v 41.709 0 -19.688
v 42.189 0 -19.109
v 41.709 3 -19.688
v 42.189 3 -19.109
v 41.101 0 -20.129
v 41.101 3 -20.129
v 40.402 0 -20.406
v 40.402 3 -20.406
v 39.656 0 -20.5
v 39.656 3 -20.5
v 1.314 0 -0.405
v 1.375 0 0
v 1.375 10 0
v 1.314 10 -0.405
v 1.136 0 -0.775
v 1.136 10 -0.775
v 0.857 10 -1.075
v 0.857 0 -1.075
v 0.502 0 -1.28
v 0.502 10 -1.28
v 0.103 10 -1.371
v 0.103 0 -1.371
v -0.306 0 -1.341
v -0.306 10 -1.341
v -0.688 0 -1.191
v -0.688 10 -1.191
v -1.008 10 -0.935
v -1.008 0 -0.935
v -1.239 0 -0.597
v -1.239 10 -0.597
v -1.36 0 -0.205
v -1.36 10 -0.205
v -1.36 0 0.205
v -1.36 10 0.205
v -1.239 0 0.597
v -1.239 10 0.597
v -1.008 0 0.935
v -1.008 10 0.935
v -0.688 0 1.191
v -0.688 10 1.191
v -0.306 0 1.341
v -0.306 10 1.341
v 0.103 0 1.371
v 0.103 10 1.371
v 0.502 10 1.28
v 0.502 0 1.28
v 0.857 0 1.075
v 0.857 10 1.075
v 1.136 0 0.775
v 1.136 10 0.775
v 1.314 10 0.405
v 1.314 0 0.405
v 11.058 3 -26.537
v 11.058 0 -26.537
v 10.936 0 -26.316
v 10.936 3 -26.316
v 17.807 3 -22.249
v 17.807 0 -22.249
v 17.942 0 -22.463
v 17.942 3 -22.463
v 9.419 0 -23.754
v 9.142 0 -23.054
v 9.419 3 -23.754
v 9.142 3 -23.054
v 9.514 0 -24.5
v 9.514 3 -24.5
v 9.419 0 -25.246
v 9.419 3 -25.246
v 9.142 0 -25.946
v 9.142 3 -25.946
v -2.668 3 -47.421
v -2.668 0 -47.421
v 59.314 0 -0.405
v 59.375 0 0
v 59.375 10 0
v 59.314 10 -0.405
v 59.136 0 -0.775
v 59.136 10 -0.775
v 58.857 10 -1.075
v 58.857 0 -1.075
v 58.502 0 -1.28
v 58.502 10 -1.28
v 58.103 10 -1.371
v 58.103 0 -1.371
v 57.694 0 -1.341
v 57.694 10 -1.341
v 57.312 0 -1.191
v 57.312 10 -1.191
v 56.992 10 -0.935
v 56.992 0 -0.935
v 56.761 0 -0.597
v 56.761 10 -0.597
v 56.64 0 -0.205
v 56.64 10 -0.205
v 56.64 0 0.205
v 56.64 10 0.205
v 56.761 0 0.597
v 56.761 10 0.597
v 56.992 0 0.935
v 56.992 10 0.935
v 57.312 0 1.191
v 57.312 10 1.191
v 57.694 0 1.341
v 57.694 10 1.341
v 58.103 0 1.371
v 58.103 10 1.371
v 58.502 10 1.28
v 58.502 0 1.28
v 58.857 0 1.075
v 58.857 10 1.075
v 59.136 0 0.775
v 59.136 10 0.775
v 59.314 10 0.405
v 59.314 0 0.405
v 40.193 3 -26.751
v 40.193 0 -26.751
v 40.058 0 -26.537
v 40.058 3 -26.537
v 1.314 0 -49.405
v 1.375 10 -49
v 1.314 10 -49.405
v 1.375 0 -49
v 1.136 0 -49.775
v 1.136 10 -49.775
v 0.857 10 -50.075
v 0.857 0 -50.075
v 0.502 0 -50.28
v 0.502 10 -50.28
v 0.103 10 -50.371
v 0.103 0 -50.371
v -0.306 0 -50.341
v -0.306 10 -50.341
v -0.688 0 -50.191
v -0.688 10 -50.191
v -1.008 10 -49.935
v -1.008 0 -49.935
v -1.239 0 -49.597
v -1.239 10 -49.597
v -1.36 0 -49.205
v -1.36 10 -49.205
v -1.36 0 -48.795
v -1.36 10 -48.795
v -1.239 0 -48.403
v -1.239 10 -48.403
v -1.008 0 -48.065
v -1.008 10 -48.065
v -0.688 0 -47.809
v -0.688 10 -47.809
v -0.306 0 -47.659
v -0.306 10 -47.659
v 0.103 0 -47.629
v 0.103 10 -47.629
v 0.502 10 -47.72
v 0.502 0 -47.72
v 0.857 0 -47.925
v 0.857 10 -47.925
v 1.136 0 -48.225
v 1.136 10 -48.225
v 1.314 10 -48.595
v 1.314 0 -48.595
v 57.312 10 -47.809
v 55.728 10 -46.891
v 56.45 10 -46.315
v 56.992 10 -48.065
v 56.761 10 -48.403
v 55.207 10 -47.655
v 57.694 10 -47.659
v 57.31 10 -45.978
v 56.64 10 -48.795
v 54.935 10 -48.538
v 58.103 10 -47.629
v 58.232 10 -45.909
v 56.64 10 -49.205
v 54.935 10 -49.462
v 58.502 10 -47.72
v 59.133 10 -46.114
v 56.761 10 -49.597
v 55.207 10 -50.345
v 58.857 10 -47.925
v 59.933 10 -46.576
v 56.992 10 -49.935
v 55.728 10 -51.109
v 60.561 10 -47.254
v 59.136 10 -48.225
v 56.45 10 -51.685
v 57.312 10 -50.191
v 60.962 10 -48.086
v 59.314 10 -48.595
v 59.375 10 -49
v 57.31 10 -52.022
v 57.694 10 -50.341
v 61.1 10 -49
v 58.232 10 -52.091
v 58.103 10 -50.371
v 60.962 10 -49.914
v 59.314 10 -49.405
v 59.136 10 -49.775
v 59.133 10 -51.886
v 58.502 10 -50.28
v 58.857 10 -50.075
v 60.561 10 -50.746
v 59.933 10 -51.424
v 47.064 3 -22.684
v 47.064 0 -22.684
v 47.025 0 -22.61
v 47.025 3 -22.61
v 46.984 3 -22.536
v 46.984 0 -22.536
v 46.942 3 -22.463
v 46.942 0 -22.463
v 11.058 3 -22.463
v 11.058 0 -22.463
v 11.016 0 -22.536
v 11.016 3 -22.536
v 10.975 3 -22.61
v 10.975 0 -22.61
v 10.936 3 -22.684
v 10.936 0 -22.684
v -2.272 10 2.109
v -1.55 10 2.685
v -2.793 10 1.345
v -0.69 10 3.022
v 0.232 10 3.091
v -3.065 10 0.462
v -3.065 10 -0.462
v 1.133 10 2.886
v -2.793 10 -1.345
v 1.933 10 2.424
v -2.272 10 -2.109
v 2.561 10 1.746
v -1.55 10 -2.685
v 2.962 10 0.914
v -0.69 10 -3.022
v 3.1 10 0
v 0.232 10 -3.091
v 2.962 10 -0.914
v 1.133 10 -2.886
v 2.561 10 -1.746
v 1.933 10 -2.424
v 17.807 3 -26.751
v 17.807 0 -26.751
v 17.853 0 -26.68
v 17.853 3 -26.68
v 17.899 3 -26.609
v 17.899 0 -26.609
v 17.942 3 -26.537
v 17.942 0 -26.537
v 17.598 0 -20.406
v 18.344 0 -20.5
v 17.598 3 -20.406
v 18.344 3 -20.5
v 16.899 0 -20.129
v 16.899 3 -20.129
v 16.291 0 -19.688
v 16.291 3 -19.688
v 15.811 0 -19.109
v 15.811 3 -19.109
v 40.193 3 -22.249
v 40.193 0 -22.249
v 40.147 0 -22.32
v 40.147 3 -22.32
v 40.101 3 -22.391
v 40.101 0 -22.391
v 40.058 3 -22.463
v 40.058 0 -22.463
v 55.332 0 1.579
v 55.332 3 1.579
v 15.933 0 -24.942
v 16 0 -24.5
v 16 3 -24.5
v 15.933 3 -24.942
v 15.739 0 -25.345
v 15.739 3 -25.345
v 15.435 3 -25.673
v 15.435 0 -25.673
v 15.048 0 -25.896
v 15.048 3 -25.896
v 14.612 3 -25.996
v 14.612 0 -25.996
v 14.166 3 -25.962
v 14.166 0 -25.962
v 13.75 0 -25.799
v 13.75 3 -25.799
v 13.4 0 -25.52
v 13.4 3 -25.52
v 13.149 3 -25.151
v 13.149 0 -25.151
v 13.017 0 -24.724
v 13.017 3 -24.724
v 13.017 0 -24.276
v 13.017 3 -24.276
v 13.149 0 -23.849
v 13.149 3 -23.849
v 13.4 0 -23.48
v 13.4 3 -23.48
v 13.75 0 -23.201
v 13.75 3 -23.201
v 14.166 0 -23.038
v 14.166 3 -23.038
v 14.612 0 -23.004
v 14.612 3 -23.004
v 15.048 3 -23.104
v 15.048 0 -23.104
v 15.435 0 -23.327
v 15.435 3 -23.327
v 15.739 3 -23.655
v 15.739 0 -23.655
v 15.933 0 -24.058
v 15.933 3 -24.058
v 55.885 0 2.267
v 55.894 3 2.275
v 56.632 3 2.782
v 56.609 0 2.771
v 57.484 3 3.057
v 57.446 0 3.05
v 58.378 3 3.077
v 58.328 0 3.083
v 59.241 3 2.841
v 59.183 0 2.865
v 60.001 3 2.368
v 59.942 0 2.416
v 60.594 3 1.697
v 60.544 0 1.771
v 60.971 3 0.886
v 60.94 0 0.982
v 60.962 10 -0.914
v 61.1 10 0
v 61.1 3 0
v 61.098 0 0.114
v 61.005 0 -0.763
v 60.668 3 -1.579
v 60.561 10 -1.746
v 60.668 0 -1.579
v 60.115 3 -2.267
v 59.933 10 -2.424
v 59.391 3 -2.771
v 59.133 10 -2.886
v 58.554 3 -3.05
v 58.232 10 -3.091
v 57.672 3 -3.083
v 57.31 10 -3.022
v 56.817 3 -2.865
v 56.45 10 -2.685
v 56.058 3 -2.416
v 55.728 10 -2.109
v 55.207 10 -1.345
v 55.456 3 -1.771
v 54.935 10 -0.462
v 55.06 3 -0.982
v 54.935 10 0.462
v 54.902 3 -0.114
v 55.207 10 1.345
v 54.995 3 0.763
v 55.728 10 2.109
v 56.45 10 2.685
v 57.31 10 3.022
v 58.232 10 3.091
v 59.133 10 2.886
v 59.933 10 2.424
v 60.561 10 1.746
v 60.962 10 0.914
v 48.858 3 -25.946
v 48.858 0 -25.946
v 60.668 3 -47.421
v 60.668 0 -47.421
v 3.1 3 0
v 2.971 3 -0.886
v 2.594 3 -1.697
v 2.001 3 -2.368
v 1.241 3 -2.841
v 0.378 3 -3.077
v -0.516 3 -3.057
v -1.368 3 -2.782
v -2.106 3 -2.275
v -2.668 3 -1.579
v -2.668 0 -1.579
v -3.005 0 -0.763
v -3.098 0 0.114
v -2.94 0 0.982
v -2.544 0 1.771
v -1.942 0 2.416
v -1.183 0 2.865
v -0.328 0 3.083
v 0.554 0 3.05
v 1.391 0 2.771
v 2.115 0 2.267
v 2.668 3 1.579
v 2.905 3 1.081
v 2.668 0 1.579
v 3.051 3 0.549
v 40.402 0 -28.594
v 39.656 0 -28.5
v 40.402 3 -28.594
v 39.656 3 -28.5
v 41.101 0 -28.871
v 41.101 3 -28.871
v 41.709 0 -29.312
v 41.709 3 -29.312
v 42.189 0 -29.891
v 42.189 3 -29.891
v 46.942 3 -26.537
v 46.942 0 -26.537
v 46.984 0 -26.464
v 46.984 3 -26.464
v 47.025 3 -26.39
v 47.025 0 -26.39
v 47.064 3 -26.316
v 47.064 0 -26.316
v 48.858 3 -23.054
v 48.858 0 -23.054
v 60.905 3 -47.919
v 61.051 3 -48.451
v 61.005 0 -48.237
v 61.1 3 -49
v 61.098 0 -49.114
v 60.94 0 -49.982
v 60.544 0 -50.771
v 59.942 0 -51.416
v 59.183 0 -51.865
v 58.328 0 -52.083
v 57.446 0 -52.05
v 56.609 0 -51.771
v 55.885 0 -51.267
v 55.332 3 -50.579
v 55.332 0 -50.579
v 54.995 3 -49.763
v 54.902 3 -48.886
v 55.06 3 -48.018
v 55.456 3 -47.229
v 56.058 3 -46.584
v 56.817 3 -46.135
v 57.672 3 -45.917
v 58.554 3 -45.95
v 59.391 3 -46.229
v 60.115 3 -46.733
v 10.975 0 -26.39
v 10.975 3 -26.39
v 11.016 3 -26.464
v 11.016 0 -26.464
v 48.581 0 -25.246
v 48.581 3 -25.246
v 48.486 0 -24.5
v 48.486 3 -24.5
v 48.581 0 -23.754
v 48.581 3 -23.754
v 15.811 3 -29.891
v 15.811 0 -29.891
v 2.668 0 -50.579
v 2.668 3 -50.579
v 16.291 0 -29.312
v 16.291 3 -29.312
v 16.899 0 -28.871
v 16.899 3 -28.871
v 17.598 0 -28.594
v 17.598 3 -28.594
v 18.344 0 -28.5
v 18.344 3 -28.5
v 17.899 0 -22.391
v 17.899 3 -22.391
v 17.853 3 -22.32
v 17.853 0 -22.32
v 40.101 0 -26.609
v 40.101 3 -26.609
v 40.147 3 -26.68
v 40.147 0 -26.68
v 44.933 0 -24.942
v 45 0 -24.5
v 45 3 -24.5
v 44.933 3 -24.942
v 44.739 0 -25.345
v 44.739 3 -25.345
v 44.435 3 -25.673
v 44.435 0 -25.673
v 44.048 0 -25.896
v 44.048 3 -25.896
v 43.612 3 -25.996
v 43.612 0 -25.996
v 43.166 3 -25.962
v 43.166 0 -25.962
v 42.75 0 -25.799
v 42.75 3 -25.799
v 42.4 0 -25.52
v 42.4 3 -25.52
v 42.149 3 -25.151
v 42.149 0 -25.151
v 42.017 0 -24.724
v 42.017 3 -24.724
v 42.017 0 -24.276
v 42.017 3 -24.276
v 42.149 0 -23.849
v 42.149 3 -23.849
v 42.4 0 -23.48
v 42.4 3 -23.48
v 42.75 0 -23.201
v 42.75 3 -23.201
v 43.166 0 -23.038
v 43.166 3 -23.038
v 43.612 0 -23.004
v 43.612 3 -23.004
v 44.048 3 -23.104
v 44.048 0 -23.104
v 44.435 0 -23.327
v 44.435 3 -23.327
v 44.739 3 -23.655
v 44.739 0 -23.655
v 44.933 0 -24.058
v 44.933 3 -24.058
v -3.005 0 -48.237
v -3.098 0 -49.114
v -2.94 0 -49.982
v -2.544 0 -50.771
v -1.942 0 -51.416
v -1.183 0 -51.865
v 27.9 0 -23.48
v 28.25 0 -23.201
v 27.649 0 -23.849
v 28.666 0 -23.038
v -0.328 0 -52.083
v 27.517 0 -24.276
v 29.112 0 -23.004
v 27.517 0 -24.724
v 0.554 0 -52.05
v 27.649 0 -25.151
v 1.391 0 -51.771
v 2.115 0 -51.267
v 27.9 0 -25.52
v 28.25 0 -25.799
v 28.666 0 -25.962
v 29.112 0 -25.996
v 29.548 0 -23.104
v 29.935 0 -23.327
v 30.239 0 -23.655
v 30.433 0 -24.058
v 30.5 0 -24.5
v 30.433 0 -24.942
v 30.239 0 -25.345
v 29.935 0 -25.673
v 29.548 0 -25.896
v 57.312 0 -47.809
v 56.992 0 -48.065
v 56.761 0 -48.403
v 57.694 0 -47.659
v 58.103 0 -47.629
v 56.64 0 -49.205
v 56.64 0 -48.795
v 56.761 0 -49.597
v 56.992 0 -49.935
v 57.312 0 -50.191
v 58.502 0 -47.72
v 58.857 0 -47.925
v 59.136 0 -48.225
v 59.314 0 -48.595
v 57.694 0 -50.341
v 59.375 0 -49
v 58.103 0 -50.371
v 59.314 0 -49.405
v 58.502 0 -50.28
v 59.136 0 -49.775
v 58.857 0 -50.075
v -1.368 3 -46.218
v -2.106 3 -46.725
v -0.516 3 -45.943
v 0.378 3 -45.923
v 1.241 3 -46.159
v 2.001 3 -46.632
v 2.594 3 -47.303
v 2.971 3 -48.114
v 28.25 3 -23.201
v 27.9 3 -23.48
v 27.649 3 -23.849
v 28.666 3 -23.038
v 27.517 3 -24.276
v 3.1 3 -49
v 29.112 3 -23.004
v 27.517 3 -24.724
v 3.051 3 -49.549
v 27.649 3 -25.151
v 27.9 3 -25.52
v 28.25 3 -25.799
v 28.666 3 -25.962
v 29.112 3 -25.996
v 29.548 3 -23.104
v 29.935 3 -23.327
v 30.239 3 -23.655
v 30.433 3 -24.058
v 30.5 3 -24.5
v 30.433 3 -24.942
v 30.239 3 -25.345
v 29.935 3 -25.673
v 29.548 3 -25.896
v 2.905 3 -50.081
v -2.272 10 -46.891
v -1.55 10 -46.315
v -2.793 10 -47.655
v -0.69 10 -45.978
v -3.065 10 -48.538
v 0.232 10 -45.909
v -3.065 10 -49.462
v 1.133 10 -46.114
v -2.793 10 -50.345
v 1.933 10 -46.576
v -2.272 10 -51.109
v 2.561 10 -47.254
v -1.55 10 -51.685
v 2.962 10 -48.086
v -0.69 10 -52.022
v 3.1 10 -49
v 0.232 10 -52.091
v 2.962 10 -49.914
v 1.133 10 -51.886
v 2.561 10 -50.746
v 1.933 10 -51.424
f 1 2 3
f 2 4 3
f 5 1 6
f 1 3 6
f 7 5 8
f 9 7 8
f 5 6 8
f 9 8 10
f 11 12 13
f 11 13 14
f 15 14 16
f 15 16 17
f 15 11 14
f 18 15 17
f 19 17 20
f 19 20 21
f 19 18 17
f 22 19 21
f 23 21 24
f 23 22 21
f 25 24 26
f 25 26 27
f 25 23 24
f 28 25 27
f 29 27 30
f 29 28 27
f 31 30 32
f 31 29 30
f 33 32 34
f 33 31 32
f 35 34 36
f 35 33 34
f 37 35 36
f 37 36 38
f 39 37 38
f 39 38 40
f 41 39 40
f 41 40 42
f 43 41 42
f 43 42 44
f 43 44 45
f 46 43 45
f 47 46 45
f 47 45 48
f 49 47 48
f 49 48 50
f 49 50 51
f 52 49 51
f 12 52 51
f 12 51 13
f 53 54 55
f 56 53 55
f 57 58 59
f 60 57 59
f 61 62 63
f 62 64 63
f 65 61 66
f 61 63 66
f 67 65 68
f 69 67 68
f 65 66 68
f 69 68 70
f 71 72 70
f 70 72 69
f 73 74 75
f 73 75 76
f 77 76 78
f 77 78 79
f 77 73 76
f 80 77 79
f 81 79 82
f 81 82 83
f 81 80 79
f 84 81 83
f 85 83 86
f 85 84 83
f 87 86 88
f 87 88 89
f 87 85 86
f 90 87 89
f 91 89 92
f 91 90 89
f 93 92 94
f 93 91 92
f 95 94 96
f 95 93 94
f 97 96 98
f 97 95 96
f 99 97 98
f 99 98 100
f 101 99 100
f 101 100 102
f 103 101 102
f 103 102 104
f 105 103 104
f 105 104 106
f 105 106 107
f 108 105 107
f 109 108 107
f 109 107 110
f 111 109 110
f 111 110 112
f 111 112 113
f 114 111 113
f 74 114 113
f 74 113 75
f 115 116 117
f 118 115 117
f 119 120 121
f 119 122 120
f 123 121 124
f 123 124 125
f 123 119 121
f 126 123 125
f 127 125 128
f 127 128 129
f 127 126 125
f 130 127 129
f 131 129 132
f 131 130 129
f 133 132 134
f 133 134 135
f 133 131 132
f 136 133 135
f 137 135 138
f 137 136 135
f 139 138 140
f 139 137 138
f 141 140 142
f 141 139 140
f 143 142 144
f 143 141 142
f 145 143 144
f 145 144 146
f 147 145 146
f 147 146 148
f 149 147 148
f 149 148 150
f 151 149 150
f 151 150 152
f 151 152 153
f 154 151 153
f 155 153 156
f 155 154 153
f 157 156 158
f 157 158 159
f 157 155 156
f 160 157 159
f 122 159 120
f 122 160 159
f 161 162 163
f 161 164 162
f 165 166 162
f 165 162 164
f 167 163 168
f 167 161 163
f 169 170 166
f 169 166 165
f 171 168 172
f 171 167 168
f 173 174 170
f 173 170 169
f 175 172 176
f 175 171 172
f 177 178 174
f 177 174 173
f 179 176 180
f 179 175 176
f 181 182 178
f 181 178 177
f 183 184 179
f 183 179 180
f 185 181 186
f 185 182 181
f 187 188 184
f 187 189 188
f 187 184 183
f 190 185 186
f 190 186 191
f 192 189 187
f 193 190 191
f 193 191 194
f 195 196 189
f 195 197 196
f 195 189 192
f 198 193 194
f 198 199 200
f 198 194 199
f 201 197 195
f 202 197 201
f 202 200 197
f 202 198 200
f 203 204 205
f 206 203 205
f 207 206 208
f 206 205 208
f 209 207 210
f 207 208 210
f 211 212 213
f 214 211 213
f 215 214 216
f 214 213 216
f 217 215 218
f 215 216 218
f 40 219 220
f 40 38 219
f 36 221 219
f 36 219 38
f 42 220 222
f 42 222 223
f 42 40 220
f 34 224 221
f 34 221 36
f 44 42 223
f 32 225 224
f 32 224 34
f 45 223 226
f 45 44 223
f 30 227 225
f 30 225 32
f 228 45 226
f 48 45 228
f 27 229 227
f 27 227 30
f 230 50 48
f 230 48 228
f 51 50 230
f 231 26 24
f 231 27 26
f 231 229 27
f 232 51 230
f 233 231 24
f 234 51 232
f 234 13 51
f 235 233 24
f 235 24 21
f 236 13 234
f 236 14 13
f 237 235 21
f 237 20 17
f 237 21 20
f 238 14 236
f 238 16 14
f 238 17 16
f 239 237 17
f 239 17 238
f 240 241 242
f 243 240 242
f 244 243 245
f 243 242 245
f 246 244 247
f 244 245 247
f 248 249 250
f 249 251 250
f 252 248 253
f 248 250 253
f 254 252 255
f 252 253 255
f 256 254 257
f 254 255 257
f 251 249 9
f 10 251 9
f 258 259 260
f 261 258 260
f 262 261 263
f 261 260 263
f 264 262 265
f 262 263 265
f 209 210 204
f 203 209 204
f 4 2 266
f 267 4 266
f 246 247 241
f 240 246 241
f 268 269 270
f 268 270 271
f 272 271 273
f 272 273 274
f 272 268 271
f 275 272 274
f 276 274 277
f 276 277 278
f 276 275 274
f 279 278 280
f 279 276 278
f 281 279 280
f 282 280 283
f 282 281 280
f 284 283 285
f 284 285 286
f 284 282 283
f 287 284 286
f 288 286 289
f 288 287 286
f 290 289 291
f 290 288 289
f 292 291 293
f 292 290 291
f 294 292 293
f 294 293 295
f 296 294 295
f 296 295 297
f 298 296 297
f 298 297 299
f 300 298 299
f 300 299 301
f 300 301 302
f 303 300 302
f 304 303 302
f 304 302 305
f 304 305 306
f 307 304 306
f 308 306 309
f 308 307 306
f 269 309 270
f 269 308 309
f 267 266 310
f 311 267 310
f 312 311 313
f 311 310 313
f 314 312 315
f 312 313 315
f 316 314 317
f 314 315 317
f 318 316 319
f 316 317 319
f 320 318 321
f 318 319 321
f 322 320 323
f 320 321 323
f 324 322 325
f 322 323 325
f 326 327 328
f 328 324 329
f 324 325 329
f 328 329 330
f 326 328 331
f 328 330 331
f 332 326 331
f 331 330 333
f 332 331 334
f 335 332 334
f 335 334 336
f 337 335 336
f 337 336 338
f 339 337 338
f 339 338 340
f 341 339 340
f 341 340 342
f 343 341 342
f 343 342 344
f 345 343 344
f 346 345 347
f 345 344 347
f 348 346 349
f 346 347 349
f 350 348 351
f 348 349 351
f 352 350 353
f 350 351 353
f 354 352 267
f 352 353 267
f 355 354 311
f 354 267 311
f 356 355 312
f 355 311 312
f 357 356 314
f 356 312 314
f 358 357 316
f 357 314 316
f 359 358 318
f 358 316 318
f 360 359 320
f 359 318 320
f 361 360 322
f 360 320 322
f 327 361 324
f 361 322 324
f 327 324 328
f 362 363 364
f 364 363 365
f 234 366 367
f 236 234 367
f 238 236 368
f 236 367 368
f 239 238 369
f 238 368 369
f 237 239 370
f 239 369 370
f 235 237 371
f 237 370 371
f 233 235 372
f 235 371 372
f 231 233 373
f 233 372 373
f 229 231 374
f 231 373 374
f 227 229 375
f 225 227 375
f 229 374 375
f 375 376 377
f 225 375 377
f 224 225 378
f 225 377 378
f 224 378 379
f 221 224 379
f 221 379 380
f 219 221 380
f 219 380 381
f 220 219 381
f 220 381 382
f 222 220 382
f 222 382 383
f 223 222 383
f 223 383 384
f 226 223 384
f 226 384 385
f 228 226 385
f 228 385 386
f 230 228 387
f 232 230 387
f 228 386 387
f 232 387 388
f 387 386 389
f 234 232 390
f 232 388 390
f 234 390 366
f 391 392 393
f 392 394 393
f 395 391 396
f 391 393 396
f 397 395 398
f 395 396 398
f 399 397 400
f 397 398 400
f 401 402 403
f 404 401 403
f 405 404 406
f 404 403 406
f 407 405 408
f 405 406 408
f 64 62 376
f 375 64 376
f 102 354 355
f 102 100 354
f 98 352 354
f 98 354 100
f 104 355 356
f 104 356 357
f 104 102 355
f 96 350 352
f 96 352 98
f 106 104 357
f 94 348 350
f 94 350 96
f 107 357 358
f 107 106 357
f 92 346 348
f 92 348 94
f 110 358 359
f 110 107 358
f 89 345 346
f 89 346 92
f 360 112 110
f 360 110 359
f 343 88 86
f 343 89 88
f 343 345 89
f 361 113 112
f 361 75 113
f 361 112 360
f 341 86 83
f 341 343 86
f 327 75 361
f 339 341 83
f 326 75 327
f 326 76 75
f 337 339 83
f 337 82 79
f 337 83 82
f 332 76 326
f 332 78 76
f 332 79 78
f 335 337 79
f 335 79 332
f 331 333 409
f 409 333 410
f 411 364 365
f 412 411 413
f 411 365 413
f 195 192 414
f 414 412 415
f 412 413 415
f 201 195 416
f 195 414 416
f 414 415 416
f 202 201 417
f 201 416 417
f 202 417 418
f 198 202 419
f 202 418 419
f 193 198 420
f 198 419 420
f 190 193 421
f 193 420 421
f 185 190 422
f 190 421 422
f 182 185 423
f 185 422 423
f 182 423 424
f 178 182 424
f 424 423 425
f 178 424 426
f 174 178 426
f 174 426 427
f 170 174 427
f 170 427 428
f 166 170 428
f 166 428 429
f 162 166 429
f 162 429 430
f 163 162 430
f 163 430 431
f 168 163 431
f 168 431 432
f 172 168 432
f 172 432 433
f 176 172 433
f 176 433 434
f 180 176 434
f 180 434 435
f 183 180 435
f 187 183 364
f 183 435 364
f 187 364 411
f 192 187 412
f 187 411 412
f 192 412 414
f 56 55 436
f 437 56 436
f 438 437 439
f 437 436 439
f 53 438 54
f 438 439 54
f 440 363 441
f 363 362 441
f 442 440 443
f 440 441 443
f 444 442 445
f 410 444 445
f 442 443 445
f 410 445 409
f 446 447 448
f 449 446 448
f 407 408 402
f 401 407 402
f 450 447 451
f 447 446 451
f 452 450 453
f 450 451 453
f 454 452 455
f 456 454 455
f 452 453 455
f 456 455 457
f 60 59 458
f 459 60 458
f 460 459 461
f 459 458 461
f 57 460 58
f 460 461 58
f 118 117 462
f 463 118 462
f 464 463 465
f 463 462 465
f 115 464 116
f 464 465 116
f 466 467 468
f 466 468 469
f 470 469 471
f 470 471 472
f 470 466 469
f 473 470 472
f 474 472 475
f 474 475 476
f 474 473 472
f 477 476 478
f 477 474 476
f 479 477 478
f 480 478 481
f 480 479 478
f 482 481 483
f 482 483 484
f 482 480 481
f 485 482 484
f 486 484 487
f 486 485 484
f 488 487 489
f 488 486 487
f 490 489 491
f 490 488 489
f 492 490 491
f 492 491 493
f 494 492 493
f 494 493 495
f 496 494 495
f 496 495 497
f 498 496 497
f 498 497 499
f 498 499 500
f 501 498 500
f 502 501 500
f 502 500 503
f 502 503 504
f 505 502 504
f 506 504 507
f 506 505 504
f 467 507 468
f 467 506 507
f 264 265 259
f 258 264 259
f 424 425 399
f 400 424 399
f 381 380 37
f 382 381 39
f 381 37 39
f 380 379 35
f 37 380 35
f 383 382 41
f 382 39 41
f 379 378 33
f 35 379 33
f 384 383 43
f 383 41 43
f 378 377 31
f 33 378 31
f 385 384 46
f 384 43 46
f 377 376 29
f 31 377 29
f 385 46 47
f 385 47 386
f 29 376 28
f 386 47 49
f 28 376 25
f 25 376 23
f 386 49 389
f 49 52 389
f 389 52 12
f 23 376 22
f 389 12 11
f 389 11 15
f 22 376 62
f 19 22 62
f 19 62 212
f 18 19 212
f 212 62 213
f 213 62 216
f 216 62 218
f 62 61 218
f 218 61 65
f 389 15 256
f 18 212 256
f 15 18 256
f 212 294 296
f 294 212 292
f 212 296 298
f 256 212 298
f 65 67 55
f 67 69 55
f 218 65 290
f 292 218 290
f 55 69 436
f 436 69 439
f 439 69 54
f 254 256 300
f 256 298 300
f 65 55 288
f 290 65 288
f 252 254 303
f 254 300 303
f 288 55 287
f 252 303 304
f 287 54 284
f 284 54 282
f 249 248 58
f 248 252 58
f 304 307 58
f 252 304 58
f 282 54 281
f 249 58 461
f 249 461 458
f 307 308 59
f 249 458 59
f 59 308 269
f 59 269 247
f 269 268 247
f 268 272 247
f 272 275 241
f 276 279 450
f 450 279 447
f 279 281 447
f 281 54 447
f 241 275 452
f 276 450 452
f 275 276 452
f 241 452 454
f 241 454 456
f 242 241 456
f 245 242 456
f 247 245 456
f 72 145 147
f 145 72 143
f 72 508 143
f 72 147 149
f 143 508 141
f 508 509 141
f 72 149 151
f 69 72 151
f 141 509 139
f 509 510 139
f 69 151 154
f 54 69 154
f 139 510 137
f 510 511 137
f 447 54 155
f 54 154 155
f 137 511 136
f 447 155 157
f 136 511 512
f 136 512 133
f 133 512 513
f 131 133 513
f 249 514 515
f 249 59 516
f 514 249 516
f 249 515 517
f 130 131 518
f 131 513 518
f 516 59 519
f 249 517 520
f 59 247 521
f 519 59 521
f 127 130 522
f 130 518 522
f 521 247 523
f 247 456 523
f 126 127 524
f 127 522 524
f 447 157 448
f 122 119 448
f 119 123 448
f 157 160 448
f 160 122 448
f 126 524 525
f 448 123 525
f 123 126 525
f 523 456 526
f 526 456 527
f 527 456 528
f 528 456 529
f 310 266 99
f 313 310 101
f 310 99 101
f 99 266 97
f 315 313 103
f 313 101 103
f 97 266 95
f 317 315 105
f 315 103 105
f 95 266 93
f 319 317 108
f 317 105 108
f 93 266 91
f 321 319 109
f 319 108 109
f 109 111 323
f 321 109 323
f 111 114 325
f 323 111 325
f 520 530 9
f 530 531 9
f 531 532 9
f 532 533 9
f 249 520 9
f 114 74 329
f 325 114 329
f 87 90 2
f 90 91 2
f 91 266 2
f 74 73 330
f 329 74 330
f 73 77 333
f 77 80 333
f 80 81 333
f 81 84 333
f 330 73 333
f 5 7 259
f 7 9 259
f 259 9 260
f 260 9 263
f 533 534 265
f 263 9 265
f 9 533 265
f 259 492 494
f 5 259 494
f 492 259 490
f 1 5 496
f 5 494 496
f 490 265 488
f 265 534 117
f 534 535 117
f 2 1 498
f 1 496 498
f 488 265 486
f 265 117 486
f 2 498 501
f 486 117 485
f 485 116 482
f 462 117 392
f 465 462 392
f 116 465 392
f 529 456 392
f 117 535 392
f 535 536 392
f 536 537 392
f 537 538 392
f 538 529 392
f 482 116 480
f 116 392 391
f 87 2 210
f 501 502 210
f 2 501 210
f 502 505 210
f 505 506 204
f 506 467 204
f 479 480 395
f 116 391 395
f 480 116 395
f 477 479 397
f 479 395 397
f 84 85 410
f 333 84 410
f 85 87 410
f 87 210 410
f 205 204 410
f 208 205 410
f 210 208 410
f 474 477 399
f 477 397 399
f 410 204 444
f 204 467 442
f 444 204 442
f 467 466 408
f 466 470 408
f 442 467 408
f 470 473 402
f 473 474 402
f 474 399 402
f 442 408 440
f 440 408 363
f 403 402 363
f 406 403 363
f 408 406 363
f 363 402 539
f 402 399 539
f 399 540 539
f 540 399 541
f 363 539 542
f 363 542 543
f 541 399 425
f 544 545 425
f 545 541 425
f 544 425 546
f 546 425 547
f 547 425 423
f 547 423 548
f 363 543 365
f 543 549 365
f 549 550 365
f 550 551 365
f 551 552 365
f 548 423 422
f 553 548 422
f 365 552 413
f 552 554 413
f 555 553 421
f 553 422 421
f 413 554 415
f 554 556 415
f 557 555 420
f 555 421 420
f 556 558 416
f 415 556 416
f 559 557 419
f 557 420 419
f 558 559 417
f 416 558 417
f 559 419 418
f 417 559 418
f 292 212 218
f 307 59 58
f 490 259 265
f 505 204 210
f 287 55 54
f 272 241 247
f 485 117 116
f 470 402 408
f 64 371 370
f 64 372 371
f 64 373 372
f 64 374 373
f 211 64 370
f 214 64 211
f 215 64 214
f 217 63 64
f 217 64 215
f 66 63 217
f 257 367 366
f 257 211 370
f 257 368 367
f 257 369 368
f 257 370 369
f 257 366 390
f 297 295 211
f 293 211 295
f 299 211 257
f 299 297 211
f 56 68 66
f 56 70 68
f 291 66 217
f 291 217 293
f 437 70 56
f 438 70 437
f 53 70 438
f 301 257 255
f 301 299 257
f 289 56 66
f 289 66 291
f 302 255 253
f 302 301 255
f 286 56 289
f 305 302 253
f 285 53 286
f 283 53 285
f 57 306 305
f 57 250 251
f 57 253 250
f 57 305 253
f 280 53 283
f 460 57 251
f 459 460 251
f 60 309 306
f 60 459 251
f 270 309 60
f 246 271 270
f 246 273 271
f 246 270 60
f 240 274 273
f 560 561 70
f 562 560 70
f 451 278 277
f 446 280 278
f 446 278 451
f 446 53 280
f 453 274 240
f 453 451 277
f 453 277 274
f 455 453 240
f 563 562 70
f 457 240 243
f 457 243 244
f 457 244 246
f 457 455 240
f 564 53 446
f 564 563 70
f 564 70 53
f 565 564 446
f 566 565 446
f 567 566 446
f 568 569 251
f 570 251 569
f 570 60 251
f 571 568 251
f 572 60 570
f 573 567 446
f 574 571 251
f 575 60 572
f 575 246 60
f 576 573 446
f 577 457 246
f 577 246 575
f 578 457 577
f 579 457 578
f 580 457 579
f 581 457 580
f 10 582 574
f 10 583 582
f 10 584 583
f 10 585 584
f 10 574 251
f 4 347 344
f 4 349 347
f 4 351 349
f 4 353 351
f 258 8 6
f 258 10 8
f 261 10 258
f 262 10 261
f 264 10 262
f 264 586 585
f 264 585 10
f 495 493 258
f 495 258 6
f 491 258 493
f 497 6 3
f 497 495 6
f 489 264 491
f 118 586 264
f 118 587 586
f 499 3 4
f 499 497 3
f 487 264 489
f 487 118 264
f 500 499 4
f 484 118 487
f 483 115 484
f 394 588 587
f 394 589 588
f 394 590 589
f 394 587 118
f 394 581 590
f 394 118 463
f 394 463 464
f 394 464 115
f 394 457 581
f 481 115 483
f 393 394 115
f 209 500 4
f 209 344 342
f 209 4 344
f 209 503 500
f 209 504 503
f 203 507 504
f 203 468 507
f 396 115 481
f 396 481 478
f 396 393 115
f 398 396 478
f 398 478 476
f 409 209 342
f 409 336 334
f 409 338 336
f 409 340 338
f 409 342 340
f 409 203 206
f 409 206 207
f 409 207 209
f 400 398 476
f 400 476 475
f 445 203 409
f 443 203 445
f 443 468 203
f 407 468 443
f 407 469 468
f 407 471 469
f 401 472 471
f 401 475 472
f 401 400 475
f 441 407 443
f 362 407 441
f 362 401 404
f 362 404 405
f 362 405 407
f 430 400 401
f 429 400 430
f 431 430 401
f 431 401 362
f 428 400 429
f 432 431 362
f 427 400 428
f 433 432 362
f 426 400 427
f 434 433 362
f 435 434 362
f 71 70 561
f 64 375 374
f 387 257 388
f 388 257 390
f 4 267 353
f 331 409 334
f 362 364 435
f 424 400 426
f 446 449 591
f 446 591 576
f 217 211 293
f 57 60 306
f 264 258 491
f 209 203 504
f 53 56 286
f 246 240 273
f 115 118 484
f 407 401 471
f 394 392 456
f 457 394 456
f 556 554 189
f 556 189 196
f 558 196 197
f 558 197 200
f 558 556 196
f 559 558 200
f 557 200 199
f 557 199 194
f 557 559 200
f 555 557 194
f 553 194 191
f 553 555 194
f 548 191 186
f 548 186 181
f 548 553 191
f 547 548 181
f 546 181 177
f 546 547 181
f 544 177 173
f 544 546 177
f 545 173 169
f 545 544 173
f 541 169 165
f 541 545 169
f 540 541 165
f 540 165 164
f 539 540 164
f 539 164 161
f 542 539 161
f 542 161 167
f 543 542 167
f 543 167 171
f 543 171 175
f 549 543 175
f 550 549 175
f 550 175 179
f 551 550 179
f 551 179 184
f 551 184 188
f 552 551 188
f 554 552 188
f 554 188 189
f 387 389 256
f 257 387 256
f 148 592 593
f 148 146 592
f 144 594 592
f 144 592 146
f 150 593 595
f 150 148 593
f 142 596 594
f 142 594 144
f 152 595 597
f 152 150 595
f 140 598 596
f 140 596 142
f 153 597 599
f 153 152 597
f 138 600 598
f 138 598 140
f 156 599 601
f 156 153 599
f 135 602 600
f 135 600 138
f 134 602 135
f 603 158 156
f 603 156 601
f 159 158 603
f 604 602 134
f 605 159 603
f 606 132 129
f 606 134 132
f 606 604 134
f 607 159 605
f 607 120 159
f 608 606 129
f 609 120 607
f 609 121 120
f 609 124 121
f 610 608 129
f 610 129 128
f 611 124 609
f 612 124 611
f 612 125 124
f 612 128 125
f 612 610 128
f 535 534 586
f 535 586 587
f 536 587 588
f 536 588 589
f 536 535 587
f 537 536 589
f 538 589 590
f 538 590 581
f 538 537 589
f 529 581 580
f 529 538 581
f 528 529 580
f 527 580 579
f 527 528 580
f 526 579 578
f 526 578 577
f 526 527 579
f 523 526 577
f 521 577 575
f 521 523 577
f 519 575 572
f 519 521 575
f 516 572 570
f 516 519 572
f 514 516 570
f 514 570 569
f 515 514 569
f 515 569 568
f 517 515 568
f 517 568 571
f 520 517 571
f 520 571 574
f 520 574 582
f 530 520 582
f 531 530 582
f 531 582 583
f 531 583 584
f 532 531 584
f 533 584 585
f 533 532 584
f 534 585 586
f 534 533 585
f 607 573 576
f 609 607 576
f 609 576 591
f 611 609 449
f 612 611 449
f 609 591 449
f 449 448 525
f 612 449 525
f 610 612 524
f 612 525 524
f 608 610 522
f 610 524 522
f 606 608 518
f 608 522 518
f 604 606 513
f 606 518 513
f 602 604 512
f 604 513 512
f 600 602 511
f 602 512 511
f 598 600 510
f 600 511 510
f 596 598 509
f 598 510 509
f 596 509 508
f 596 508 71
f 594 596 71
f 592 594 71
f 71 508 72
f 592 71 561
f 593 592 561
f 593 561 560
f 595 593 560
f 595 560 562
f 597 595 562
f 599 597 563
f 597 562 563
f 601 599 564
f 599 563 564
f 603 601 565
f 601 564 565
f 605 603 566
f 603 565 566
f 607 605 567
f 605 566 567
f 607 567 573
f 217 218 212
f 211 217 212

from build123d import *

# Parameters (mm, degrees)
SKETCH1_R           = 1.5
SKETCH1_R_2         = 4
SKETCH1_R_3         = 3.1
SKETCH1_R_4         = 1.375
BOSS_EXTRUDE1_DEPTH = 3
SKETCH2_R           = 3.1
SKETCH2_R_2         = 1.375
BOSS_EXTRUDE2_DEPTH = 7
FILLET4_R           = 3


with BuildPart() as part:
    # Sketch1 → Boss-Extrude1 (new body)
    with BuildSketch(Plane(origin=(0, 0, 0), x_dir=(1, 0, 0), z_dir=(0, 1, 0))):
        with BuildLine():
            ThreePointArc((10.93588599, 22.68421055), (10.5, 24.5), (10.93588599, 26.31578945))
            Line((10.93588599, 26.31578945), (9.937320588, 24.5))
            Line((9.937320588, 24.5), (10.93588599, 22.68421055))
        make_face()
        with BuildLine():
            Line((16.695320866, 28.5), (14.5, 28.5))
            ThreePointArc((14.5, 28.5), (16.370485645, 28.035715409), (17.806752459, 26.750641726))
            Line((17.806752459, 26.750641726), (16.695320866, 28.5))
        make_face()
        with BuildLine():
            Line((14.5, 20.5), (16.695320866, 20.5))
            Line((16.695320866, 20.5), (17.806752459, 22.249358274))
            ThreePointArc((17.806752459, 22.249358274), (16.370485645, 20.964284591), (14.5, 20.5))
        make_face()
        with BuildLine():
            ThreePointArc((17.806752459, 26.750641726), (16.370485645, 28.035715409), (14.5, 28.5))
            ThreePointArc((14.5, 28.5), (12.518729486, 27.974847788), (11.057693269, 26.537283576))
            Line((11.057693269, 26.537283576), (10.93588599, 26.31578945))
            ThreePointArc((10.93588599, 26.31578945), (10.5, 24.5), (10.93588599, 22.68421055))
            Line((10.93588599, 22.68421055), (11.057693269, 22.462716424))
            ThreePointArc((11.057693269, 22.462716424), (12.518729486, 21.025152212), (14.5, 20.5))
            ThreePointArc((14.5, 20.5), (16.370485645, 20.964284591), (17.806752459, 22.249358274))
            Line((17.806752459, 22.249358274), (17.942306731, 22.462716424))
            ThreePointArc((17.942306731, 22.462716424), (18.35805825, 23.443881381), (18.5, 24.5))
            ThreePointArc((18.5, 24.5), (18.35805825, 25.556118619), (17.942306731, 26.537283576))
            Line((17.942306731, 26.537283576), (17.806752459, 26.750641726))
        make_face()
        with Locations((14.5, 24.5)):
            Circle(SKETCH1_R, mode=Mode.SUBTRACT)
        with BuildLine():
            Line((29, 28.5), (16.695320866, 28.5))
            Line((16.695320866, 28.5), (17.806752459, 26.750641726))
            ThreePointArc((17.806752459, 26.750641726), (17.876215398, 26.645033703), (17.942306731, 26.537283576))
            ThreePointArc((17.942306731, 26.537283576), (18.35805825, 25.556118619), (18.5, 24.5))
            ThreePointArc((18.5, 24.5), (18.35805825, 23.443881381), (17.942306731, 22.462716424))
            ThreePointArc((17.942306731, 22.462716424), (17.876215398, 22.354966297), (17.806752459, 22.249358274))
            Line((17.806752459, 22.249358274), (16.695320866, 20.5))
            Line((16.695320866, 20.5), (29, 20.5))
            ThreePointArc((29, 20.5), (25, 24.5), (29, 28.5))
        make_face()
        with Locations((29, 24.5)):
            Circle(SKETCH1_R_2)
        with Locations((29, 24.5)):
            Circle(SKETCH1_R, mode=Mode.SUBTRACT)
        with BuildLine():
            Line((41.304679134, 28.5), (29, 28.5))
            ThreePointArc((29, 28.5), (31.828427125, 27.328427125), (33, 24.5))
            ThreePointArc((33, 24.5), (31.828427125, 21.671572875), (29, 20.5))
            Line((29, 20.5), (41.304679134, 20.5))
            Line((41.304679134, 20.5), (40.193247541, 22.249358274))
            ThreePointArc((40.193247541, 22.249358274), (40.123784602, 22.354966297), (40.057693269, 22.462716424))
            ThreePointArc((40.057693269, 22.462716424), (39.5, 24.5), (40.057693269, 26.537283576))
            ThreePointArc((40.057693269, 26.537283576), (40.123784602, 26.645033703), (40.193247541, 26.750641726))
            Line((40.193247541, 26.750641726), (41.304679134, 28.5))
        make_face()
        with BuildLine():
            Line((40.193247541, 22.249358274), (41.304679134, 20.5))
            Line((41.304679134, 20.5), (43.5, 20.5))
            ThreePointArc((43.5, 20.5), (41.629514355, 20.964284591), (40.193247541, 22.249358274))
        make_face()
        with BuildLine():
            Line((43.5, 28.5), (41.304679134, 28.5))
            Line((41.304679134, 28.5), (40.193247541, 26.750641726))
            ThreePointArc((40.193247541, 26.750641726), (41.629514355, 28.035715409), (43.5, 28.5))
        make_face()
        with BuildLine():
            Line((48.062679412, 24.5), (47.06411401, 26.31578945))
            ThreePointArc((47.06411401, 26.31578945), (47.389502284, 25.433687303), (47.5, 24.5))
            ThreePointArc((47.5, 24.5), (47.389502284, 23.566312697), (47.06411401, 22.68421055))
            Line((47.06411401, 22.68421055), (48.062679412, 24.5))
        make_face()
        with BuildLine():
            ThreePointArc((46.942306731, 26.537283576), (45.481270514, 27.974847788), (43.5, 28.5))
            ThreePointArc((43.5, 28.5), (41.629514355, 28.035715409), (40.193247541, 26.750641726))
            Line((40.193247541, 26.750641726), (40.057693269, 26.537283576))
            ThreePointArc((40.057693269, 26.537283576), (39.5, 24.5), (40.057693269, 22.462716424))
            Line((40.057693269, 22.462716424), (40.193247541, 22.249358274))
            ThreePointArc((40.193247541, 22.249358274), (41.629514355, 20.964284591), (43.5, 20.5))
            ThreePointArc((43.5, 20.5), (45.481270514, 21.025152212), (46.942306731, 22.462716424))
            Line((46.942306731, 22.462716424), (47.06411401, 22.68421055))
            ThreePointArc((47.06411401, 22.68421055), (47.389502284, 23.566312697), (47.5, 24.5))
            ThreePointArc((47.5, 24.5), (47.389502284, 25.433687303), (47.06411401, 26.31578945))
            Line((47.06411401, 26.31578945), (46.942306731, 26.537283576))
        make_face()
        with Locations((43.5, 24.5)):
            Circle(SKETCH1_R, mode=Mode.SUBTRACT)
        with BuildLine():
            Line((43.5, 20.5), (41.304679134, 20.5))
            Line((41.304679134, 20.5), (55.332212283, -1.578894771))
            ThreePointArc((55.332212283, -1.578894771), (56.421105229, 2.667787717), (60.667787717, 1.578894771))
            Line((60.667787717, 1.578894771), (48.062679412, 24.5))
            Line((48.062679412, 24.5), (47.06411401, 22.68421055))
            ThreePointArc((47.06411401, 22.68421055), (47.004960458, 22.572501054), (46.942306731, 22.462716424))
            ThreePointArc((46.942306731, 22.462716424), (45.481270514, 21.025152212), (43.5, 20.5))
        make_face()
        with BuildLine():
            Line((55.332212283, 50.578894771), (41.304679134, 28.5))
            Line((41.304679134, 28.5), (43.5, 28.5))
            ThreePointArc((43.5, 28.5), (45.481270514, 27.974847788), (46.942306731, 26.537283576))
            ThreePointArc((46.942306731, 26.537283576), (47.004960458, 26.427498946), (47.06411401, 26.31578945))
            Line((47.06411401, 26.31578945), (48.062679412, 24.5))
            Line((48.062679412, 24.5), (60.667787717, 47.421105229))
            ThreePointArc((60.667787717, 47.421105229), (56.421105229, 46.332212283), (55.332212283, 50.578894771))
        make_face()
        with BuildLine():
            Line((10.93588599, 22.68421055), (9.937320588, 24.5))
            Line((9.937320588, 24.5), (-2.667787717, 1.578894771))
            ThreePointArc((-2.667787717, 1.578894771), (0.81849193, 2.989995144), (3.1, 0))
            ThreePointArc((3.1, 0), (2.989995144, -0.81849193), (2.667787717, -1.578894771))
            Line((2.667787717, -1.578894771), (16.695320866, 20.5))
            Line((16.695320866, 20.5), (14.5, 20.5))
            ThreePointArc((14.5, 20.5), (12.518729486, 21.025152212), (11.057693269, 22.462716424))
            ThreePointArc((11.057693269, 22.462716424), (10.995039542, 22.572501054), (10.93588599, 22.68421055))
        make_face()
        Circle(SKETCH1_R_3)
        Circle(SKETCH1_R_4, mode=Mode.SUBTRACT)
        with Locations((0, 49)):
            Circle(SKETCH1_R_3)
        with Locations((0, 49)):
            Circle(SKETCH1_R_4, mode=Mode.SUBTRACT)
        with BuildLine():
            ThreePointArc((11.057693269, 26.537283576), (12.518729486, 27.974847788), (14.5, 28.5))
            Line((14.5, 28.5), (16.695320866, 28.5))
            Line((16.695320866, 28.5), (2.667787717, 50.578894771))
            ThreePointArc((2.667787717, 50.578894771), (2.989995144, 49.81849193), (3.1, 49))
            ThreePointArc((3.1, 49), (0.81849193, 46.010004856), (-2.667787717, 47.421105229))
            Line((-2.667787717, 47.421105229), (9.937320588, 24.5))
            Line((9.937320588, 24.5), (10.93588599, 26.31578945))
            ThreePointArc((10.93588599, 26.31578945), (10.995039542, 26.427498946), (11.057693269, 26.537283576))
        make_face()
        with Locations((58, 49)):
            Circle(SKETCH1_R_3)
        with Locations((58, 49)):
            Circle(SKETCH1_R_4, mode=Mode.SUBTRACT)
        with Locations((58, 0)):
            Circle(SKETCH1_R_3)
        with Locations((58, 0)):
            Circle(SKETCH1_R_4, mode=Mode.SUBTRACT)
    extrude(amount=BOSS_EXTRUDE1_DEPTH)

    # Sketch2 → Boss-Extrude2 (add)
    with BuildSketch(Plane(origin=(0, 3, 0), x_dir=(1, 0, 0), z_dir=(0, 1, 0))):
        with Locations((0, 49)):
            Circle(SKETCH2_R)
        with Locations((0, 49)):
            Circle(SKETCH2_R_2, mode=Mode.SUBTRACT)
        with Locations((58, 49)):
            Circle(SKETCH2_R)
        with Locations((58, 49)):
            Circle(SKETCH2_R_2, mode=Mode.SUBTRACT)
        with Locations((58, 0)):
            Circle(SKETCH2_R)
        with Locations((58, 0)):
            Circle(SKETCH2_R_2, mode=Mode.SUBTRACT)
        Circle(SKETCH2_R)
        Circle(SKETCH2_R_2, mode=Mode.SUBTRACT)
    extrude(amount=BOSS_EXTRUDE2_DEPTH)

    # Fillet4
    fillet4_edges = [part.edges().sort_by_distance(p)[0] for p in [
        (41.304679134, 1.5, -20.5),
        (16.695320866, 1.5, -20.5),
        (9.937320588, 1.5, -24.5),
        (16.695320866, 1.5, -28.5),
        (41.304679134, 1.5, -28.5),
        (48.062679412, 1.5, -24.5),
    ]]
    fillet(fillet4_edges, radius=FILLET4_R)


solid = part.part
